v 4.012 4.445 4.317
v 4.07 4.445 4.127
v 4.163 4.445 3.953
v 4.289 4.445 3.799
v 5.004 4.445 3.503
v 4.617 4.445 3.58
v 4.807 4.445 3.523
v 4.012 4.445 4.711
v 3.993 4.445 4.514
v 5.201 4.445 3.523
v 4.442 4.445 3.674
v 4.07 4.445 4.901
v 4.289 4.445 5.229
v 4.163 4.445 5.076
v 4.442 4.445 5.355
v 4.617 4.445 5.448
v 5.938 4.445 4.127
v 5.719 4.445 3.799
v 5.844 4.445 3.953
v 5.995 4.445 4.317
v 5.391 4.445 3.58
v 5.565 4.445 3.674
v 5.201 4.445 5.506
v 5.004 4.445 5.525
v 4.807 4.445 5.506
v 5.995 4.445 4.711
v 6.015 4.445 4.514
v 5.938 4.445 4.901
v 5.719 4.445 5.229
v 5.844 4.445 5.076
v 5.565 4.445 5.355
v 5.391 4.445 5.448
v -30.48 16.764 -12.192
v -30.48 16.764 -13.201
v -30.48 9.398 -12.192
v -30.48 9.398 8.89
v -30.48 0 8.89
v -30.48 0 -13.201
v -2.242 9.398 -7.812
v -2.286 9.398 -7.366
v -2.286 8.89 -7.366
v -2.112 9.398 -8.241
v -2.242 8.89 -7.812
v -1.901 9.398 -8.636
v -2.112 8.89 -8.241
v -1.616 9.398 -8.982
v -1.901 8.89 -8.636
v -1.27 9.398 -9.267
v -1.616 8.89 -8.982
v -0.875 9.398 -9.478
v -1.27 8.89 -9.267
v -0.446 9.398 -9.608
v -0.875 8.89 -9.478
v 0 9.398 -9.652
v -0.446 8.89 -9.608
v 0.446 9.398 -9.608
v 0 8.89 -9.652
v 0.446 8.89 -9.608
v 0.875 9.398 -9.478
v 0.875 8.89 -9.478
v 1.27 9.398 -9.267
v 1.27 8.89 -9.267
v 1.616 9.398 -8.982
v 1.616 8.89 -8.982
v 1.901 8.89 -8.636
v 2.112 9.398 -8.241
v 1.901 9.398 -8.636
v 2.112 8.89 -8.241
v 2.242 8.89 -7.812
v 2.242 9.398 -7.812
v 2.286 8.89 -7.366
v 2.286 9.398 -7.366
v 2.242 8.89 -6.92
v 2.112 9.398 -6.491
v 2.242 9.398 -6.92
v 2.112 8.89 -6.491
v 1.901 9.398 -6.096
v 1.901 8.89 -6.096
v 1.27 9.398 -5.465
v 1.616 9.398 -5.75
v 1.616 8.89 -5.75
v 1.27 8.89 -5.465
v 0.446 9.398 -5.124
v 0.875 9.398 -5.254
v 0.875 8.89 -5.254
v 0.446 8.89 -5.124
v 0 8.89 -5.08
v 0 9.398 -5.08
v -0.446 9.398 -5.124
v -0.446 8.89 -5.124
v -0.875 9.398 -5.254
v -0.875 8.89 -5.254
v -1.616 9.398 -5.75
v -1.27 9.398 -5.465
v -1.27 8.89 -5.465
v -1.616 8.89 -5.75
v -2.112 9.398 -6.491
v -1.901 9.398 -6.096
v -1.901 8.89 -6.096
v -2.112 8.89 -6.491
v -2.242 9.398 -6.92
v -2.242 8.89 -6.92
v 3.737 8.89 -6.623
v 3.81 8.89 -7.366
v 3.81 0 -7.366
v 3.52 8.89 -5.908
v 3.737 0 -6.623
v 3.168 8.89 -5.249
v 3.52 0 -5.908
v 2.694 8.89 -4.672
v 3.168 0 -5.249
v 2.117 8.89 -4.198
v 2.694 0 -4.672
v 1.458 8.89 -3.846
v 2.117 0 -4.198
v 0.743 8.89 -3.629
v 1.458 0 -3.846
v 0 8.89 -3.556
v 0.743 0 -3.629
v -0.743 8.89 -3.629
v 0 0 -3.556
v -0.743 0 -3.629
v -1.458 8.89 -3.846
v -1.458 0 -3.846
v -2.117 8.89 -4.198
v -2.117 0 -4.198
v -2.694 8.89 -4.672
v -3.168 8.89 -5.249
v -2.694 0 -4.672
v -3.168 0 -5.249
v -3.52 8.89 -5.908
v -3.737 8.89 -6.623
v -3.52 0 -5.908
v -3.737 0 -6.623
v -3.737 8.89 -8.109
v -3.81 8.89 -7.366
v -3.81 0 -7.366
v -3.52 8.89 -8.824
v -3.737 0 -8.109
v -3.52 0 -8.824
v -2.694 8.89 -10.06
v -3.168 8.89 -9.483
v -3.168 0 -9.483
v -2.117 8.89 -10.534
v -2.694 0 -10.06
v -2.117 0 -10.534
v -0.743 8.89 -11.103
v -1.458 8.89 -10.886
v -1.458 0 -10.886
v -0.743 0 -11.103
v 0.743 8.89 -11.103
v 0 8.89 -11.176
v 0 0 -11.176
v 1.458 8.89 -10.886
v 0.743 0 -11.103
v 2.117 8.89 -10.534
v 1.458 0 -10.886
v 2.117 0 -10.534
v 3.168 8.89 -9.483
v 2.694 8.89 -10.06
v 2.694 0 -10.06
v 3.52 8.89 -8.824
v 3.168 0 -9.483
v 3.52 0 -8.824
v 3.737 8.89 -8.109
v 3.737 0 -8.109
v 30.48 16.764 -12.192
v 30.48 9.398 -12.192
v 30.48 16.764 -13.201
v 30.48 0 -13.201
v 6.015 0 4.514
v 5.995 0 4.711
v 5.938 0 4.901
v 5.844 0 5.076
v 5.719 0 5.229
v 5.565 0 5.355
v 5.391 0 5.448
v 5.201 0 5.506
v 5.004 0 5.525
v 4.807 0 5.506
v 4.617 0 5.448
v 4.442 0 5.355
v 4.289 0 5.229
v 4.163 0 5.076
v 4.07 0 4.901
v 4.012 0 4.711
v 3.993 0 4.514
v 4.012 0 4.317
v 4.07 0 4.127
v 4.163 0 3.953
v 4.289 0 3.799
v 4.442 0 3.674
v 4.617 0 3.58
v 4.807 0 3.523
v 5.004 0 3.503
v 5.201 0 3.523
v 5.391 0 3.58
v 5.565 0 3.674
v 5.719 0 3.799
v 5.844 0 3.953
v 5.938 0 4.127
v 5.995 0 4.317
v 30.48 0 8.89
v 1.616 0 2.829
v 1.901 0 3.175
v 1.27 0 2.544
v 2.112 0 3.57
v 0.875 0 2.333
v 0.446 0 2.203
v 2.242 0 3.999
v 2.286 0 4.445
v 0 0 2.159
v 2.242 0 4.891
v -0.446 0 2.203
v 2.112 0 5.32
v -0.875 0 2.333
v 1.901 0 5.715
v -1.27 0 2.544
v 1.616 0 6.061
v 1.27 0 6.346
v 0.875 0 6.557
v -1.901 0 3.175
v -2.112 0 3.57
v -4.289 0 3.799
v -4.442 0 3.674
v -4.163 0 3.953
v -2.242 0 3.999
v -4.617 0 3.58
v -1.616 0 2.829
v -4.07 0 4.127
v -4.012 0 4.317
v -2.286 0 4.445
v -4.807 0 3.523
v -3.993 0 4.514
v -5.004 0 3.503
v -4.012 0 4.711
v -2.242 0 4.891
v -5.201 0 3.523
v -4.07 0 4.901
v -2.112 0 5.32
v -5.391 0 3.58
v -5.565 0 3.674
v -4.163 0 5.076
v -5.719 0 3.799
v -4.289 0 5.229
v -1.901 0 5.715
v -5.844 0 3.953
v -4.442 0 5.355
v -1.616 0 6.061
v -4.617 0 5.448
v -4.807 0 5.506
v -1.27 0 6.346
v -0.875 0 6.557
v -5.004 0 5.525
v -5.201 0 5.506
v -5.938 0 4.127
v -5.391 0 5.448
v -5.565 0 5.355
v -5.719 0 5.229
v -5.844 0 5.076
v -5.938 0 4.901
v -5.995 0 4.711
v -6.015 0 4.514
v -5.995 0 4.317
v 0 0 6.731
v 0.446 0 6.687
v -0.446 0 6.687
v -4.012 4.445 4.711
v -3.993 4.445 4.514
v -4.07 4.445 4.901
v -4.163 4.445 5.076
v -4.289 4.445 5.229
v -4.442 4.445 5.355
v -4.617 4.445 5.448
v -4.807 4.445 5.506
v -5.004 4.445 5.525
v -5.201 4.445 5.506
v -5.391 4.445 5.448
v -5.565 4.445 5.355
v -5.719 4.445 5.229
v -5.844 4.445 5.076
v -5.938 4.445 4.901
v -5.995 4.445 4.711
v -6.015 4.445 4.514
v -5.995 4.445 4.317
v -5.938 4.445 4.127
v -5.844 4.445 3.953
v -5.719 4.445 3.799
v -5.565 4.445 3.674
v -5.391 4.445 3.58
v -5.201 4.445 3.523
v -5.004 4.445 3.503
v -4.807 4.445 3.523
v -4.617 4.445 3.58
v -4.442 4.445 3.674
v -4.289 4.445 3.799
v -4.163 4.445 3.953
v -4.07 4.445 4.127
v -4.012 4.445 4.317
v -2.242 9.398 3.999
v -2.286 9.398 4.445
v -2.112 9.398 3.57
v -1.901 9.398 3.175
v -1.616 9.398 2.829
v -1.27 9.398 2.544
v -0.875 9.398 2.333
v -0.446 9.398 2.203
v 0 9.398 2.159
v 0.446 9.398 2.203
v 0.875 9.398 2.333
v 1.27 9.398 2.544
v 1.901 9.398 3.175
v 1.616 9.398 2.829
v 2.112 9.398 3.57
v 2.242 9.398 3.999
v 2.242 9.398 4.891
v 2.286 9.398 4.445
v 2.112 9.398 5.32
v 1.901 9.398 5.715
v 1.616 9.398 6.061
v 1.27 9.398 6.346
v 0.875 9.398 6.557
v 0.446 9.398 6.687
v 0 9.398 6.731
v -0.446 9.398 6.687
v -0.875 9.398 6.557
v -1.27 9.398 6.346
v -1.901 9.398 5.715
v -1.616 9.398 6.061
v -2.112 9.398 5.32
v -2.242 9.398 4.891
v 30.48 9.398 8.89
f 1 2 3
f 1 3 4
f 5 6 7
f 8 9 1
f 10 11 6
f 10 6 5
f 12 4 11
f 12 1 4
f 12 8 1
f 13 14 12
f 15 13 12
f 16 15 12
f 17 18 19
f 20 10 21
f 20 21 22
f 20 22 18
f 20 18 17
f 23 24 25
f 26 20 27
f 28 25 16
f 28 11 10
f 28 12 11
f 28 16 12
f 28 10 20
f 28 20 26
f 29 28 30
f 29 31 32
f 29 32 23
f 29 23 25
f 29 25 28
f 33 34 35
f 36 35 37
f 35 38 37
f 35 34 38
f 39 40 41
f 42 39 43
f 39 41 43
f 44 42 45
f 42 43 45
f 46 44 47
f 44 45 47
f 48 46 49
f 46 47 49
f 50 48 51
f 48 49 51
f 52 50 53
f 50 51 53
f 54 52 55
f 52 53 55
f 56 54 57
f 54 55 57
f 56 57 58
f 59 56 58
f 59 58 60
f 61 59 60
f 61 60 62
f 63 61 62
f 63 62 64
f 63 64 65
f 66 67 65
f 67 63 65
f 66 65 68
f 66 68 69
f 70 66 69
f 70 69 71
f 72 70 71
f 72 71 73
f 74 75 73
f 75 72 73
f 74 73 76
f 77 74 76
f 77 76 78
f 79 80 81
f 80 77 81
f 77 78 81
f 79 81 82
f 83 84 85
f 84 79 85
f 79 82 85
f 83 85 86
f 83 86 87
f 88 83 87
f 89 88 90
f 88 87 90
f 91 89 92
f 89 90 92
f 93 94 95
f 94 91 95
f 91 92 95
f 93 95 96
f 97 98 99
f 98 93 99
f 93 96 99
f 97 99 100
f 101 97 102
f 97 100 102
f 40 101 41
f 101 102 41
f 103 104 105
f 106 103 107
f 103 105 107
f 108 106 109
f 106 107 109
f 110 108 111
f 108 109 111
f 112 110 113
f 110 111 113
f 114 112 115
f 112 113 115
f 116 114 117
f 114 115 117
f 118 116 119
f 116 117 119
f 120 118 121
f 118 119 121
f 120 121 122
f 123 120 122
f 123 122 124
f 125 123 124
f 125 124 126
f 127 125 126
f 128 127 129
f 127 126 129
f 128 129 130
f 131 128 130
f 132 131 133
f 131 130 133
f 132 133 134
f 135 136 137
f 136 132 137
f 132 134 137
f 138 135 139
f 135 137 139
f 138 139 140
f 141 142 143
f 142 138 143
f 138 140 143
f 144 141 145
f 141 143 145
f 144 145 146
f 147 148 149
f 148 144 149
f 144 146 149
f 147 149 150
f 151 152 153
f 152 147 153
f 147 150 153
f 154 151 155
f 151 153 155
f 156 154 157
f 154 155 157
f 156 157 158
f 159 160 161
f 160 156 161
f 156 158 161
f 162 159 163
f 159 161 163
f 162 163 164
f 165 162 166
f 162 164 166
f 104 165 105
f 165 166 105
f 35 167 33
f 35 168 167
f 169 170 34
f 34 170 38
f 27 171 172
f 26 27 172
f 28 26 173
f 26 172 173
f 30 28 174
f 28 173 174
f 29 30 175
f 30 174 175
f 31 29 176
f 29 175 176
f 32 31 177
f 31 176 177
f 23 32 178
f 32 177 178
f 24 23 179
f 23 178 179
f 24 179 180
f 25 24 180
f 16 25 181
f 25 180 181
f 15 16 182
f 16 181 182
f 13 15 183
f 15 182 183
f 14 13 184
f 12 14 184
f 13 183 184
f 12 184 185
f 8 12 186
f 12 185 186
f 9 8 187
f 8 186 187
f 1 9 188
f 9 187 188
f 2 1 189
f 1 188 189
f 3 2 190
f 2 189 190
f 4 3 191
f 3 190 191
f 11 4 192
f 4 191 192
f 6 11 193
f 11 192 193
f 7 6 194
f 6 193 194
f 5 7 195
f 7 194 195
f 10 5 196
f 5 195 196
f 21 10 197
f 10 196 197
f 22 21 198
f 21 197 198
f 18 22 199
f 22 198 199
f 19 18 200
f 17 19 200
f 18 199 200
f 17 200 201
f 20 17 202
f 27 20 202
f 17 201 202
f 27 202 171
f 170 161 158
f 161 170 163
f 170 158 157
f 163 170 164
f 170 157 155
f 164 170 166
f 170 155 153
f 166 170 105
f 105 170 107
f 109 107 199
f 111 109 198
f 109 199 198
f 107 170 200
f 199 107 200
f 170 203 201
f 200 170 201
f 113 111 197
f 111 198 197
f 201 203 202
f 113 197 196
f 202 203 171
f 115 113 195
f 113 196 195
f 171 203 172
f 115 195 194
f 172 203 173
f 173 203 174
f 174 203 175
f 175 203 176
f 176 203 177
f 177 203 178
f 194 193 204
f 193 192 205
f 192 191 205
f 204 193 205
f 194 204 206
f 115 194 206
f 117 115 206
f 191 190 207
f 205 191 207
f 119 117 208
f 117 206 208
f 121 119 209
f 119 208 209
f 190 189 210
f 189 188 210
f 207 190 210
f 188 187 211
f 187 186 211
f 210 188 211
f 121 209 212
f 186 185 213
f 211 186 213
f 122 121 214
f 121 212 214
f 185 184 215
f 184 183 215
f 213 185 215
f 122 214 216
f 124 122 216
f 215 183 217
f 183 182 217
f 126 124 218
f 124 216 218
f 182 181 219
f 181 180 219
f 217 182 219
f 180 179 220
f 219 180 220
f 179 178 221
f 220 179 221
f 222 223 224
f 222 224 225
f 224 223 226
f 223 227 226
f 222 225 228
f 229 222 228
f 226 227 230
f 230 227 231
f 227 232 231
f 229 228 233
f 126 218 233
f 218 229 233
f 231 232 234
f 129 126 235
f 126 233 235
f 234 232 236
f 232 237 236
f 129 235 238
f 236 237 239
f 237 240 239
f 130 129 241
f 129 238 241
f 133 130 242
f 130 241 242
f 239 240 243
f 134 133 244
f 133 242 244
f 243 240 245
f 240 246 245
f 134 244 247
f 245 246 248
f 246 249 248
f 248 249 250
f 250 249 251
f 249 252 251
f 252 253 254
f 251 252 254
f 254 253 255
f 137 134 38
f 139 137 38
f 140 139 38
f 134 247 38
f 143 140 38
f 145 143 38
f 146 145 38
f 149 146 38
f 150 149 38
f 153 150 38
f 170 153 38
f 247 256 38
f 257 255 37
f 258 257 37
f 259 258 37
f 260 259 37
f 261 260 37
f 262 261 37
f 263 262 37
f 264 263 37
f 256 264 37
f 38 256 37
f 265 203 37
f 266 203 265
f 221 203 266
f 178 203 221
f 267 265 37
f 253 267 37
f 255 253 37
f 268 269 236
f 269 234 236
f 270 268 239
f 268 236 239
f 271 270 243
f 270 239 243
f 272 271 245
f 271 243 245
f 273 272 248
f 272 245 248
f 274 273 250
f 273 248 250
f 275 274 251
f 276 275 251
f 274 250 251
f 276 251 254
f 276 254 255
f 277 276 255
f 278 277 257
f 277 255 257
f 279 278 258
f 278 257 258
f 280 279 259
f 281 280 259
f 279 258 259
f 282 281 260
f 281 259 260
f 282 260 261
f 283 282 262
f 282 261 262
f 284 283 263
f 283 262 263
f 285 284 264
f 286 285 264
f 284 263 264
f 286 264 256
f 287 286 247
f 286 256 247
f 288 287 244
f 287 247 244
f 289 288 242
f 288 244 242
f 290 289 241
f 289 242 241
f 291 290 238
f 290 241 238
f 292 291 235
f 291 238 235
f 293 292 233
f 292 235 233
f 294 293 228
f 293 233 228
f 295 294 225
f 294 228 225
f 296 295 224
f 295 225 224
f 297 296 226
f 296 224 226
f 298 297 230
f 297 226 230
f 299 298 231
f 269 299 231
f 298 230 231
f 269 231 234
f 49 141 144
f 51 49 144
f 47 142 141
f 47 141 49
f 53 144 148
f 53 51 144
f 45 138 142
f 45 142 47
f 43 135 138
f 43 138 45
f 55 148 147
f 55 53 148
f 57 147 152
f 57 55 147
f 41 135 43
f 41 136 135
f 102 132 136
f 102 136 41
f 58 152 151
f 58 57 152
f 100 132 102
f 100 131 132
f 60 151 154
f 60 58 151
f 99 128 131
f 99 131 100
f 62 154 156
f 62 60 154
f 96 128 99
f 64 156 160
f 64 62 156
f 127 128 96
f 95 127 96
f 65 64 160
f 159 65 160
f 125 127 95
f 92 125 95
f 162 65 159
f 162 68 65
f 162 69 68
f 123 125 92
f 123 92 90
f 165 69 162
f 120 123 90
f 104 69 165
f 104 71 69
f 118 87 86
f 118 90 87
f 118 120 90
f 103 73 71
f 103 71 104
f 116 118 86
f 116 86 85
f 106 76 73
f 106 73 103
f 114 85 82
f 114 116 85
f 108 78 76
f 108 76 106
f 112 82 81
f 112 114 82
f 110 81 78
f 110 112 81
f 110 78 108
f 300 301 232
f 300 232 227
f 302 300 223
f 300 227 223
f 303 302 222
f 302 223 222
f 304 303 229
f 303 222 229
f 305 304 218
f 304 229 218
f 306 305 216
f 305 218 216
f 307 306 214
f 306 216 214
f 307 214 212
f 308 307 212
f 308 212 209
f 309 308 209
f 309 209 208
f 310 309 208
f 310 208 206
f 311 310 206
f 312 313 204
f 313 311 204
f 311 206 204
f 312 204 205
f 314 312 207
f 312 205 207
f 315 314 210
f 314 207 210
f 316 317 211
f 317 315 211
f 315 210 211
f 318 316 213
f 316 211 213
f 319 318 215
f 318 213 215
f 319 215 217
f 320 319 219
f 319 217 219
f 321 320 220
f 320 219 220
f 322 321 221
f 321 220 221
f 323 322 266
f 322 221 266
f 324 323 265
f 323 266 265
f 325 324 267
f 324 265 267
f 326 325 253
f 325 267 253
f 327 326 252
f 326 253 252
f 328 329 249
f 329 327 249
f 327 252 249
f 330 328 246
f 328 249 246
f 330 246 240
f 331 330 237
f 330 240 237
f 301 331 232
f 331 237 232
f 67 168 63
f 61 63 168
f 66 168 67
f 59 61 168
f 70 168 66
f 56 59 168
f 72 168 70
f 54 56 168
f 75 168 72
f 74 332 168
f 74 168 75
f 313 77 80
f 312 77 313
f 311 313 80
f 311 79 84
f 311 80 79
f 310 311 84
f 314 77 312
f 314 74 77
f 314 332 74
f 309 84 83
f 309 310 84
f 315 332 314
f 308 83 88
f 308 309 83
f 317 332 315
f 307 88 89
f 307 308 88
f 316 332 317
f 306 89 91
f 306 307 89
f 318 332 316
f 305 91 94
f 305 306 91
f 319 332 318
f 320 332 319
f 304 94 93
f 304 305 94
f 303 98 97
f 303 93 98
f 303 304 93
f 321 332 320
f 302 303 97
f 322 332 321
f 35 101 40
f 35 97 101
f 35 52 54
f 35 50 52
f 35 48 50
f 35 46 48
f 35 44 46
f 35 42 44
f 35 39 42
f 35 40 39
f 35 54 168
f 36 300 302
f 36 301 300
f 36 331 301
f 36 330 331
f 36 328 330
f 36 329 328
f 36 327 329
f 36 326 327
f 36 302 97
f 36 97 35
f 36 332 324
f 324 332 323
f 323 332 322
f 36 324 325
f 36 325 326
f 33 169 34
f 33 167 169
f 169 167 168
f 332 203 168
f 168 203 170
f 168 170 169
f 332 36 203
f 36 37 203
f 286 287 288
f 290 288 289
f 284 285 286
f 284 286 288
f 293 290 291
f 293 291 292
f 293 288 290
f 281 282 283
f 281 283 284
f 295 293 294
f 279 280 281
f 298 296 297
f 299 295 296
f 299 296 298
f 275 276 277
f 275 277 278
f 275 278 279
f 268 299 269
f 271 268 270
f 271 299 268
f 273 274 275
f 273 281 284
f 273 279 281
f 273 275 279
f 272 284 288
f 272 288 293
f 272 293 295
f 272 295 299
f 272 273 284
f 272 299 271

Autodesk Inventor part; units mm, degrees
ref_plane "YZ Plane" through (0, 0, 0) normal (1, 0, 0) x (0, 1, 0)
ref_plane "XZ Plane" through (0, 0, 0) normal (0, 1, 0) x (-1, 0, 0)
ref_plane "XY Plane" through (0, 0, 0) normal (0, 0, 1) x (1, 0, 0)
sketch "Sketch1" plane through (0, 0, 0) normal (0, 1, 0) x (-1, 0, 0)
  line L0 (0, 0) -> (30.48, 0)
  line L1 (30.48, 0) -> (-30.48, 0)
  line L2 (-30.48, 0) -> (-30.48, -12.192)
  line L3 (-30.48, -12.192) -> (30.48, -12.192)
  line L4 (30.48, -12.192) -> (30.48, 0)
  line L5 (30.48, -12.192) -> (30.48, -11.938)
  line L6 (30.48, -11.938) -> (-30.48, -11.938)
  line L7 (0, 0) -> (0, -7.366)
  circle A0 centre (0, -7.366) radius 2.286
  line L8 (30.48, 0) -> (30.48, 8.89)
  line L9 (30.48, 8.89) -> (-30.48, 8.89)
  line L10 (-30.48, 8.89) -> (-30.48, 0)
  line L11 (30.48, 0) -> (-30.48, 0)
  line L12 (0, 0) -> (0, 4.445)
  circle A1 centre (0, 4.445) radius 2.286
  line L13 (30.48, -12.192) -> (-30.48, -12.192)
  line L14 (-30.48, -12.192) -> (-30.48, -13.2008)
  line L15 (-30.48, -13.2008) -> (30.48, -13.2008)
  line L16 (30.48, -13.2008) -> (30.48, -12.192)
  dimension "d0" = 30.48
  dimension "d1" = 60.96
  dimension "d2" = 12.192
  dimension "d3" = 0.254
  dimension "d4" = 7.366
  dimension "d5" = 4.572
  dimension "d14" = 8.89
  dimension "d15" = 4.572
extrude "Extrusion1" add sketch "Sketch1" along normal blind 9.398 contours L0 L4 L6 L2 L1 | L4 L3 L2 L6
extrude "Extrusion2" add sketch "Sketch1" along normal blind 16.764 contours L16 L15 L14 L3
sketch "Sketch2" plane through (0, 0, 0) normal (0, -1, 0) x (1, 0, 0)
  line L0 (0, 0) -> (0, -7.366)
  circle A0 centre (0, -7.366) radius 3.81
  dimension "d10" = 7.366
  dimension "d11" = 7.62
extrude "Extrusion3" cut sketch "Sketch2" against normal blind 8.89
extrude "Extrusion4" add sketch "Sketch1" along normal blind 9.398 contours L1 L10 L9 L8 L0
sketch "Sketch3" plane through (0, 0, 0) normal (0, -1, 0) x (1, 0, 0)
  line L0 (0, 4.5142) -> (5.0038, 4.5142)
  line L1 (0, 4.5142) -> (-5.0038, 4.5142)
  circle A0 centre (5.0038, 4.5142) radius 1.0109
  circle A1 centre (-5.0038, 4.5142) radius 1.0109
  point P0 (0, 0)
  dimension "d18" = 5.0038
  dimension "d19" = 5.0038
  dimension "d20" = 2.0218
  dimension "d21" = 2.0218
extrude "Extrusion5" cut sketch "Sketch3" against normal blind 4.445
properties part number "VA100CPtoPolarisAdapter"
